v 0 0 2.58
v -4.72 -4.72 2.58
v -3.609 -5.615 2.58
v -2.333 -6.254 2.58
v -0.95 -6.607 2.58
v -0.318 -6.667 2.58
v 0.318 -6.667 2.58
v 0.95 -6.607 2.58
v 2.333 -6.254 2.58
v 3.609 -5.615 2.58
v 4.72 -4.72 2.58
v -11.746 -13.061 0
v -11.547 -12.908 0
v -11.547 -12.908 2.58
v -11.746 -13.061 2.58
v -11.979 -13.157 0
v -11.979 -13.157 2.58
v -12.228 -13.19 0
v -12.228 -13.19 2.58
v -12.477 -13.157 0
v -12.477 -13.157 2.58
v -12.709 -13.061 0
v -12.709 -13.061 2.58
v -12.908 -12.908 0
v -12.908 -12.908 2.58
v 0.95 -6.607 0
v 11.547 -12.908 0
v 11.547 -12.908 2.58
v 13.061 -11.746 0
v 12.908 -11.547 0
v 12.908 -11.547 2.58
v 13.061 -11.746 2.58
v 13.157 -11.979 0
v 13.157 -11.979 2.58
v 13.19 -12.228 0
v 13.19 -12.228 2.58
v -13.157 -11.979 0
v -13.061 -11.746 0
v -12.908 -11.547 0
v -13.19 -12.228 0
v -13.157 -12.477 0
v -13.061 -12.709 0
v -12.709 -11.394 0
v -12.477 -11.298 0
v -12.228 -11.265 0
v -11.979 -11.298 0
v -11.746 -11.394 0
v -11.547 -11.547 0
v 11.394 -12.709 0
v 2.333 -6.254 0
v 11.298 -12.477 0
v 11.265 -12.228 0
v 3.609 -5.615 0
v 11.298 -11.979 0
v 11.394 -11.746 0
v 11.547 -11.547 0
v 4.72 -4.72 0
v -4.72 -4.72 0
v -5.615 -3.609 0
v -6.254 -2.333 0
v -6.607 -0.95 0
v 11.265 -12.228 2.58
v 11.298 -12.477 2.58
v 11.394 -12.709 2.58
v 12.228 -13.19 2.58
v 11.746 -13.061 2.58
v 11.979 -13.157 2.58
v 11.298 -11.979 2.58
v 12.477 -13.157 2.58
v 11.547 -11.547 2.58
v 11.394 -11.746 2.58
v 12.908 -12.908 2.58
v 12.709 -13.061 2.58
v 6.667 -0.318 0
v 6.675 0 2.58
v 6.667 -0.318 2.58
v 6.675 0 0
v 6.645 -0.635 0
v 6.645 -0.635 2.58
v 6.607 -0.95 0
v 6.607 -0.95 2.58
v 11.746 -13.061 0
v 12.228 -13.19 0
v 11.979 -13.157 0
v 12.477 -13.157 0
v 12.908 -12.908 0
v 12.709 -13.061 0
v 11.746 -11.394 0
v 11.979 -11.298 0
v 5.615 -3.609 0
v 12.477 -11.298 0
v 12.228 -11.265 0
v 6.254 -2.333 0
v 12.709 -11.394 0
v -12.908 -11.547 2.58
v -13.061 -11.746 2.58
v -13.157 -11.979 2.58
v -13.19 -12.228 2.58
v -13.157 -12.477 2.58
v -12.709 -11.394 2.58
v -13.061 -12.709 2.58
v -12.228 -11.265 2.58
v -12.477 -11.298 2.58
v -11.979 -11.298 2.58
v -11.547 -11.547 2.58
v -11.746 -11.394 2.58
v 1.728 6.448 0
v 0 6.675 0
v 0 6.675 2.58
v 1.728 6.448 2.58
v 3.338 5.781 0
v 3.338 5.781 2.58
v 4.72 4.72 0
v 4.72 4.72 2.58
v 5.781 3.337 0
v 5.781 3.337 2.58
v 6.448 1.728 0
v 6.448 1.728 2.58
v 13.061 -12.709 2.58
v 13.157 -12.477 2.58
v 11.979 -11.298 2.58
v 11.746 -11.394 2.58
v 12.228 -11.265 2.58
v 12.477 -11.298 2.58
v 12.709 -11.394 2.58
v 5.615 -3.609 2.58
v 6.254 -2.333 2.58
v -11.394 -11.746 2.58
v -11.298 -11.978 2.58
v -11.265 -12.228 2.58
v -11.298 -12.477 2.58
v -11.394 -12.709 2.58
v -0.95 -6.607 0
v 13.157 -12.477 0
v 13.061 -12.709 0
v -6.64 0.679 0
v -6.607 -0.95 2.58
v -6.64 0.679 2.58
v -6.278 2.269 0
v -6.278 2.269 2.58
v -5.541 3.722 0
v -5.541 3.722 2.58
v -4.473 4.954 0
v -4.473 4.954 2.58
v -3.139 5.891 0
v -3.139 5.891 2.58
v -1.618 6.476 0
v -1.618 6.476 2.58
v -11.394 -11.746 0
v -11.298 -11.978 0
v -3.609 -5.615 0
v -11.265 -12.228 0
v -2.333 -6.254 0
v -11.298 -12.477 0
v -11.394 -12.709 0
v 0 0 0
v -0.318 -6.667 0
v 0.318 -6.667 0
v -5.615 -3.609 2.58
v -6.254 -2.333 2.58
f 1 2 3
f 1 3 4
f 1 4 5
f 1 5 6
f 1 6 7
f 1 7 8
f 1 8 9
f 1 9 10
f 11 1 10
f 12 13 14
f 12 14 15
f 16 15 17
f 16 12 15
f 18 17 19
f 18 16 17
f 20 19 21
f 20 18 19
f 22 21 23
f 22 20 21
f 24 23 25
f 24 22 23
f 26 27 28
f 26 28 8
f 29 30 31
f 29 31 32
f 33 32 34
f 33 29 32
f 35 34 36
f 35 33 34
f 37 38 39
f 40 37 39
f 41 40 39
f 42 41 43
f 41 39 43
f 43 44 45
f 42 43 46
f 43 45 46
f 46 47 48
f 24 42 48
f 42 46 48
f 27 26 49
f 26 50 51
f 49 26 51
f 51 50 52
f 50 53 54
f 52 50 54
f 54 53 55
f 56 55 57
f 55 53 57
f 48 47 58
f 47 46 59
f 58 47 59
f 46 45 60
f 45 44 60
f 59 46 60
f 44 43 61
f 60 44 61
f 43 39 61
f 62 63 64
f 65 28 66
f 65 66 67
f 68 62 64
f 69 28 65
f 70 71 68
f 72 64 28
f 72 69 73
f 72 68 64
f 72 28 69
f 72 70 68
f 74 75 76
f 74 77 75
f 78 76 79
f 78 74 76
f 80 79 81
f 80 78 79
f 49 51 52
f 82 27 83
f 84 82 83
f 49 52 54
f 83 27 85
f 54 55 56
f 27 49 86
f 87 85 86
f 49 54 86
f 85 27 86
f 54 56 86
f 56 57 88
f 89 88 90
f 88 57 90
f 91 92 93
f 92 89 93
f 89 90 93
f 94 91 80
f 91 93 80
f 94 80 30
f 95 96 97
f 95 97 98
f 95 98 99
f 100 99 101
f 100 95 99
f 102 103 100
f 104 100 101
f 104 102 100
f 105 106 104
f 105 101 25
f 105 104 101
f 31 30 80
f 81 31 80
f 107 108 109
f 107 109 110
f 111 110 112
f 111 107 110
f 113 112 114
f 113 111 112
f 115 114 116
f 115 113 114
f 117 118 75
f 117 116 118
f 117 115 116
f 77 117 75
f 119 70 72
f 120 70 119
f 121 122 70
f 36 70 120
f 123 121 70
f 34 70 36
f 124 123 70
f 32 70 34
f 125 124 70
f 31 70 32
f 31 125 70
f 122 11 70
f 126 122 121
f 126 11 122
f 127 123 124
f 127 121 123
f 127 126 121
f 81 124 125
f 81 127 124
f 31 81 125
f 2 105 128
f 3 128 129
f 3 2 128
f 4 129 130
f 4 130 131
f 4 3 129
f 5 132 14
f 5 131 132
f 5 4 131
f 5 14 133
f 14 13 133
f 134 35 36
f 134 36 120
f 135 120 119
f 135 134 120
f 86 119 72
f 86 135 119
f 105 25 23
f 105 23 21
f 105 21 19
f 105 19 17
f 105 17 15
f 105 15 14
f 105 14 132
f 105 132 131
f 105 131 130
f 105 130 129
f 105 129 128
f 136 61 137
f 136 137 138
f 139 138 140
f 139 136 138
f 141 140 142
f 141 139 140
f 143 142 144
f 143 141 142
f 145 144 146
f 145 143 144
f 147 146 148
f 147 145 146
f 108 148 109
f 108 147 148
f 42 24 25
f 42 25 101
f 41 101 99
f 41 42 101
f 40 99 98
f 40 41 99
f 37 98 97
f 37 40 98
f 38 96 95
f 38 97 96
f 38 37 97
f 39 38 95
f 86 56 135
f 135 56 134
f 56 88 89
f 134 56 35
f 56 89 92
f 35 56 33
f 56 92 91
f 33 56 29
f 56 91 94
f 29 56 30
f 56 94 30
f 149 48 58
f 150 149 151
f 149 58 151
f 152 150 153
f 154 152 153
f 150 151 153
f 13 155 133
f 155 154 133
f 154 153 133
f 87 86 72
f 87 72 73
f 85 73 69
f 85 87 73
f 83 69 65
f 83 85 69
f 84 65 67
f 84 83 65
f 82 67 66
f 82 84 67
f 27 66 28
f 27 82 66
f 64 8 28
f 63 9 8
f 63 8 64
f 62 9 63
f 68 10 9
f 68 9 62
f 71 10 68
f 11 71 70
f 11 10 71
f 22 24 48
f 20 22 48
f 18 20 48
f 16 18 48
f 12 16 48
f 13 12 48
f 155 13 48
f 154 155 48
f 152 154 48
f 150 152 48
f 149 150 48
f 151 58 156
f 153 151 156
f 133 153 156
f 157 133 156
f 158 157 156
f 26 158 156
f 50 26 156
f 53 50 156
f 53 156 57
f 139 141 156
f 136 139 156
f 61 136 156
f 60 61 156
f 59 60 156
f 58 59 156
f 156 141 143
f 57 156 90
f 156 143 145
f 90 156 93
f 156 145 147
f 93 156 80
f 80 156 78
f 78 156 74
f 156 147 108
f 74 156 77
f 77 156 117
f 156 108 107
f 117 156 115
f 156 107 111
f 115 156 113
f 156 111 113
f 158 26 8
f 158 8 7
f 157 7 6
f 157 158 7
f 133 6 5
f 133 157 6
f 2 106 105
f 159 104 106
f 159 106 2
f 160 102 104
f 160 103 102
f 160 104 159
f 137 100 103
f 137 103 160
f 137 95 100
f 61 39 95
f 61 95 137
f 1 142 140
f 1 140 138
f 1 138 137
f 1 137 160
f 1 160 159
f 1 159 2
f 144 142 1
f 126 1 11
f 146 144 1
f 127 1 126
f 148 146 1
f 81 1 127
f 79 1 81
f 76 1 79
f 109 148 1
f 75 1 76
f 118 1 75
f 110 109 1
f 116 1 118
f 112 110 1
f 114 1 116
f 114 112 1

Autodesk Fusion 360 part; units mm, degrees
sketch "Sketch1" plane through (0, 0, 0) normal (0, 0, 1) x (1, 0, 0)
  line L0 (0, 0) -> (12.9082, -12.9082)
  line L1 (1.75, 0) -> (22.5, 0)
  line L2 (0, 0) -> (-12.9082, -12.9082)
  circle A0 centre (-12.2276, -12.2276) radius 0.9625
  circle A1 centre (12.2276, -12.2276) radius 0.9625
  circle A2 centre (0, 0) radius 6.675
  line L3 (-13.701, -10.7542) -> (-10.5388, -13.9165) construction
  line L4 (-12.9082, -11.5471) -> (-6.607, -0.9502)
  line L5 (-11.5471, -12.9082) -> (-0.9502, -6.607)
  line L6 (0, 1.75) -> (0, 22.5)
  line L7 (12.9082, -11.5471) -> (6.607, -0.9502)
  line L8 (11.5471, -12.9082) -> (0.9502, -6.607)
  dimension "d1" = 18.255
  dimension "d2" = 45
  dimension "d4" = -90
  dimension "d5" = 1.925
  dimension "d6" = 1.925
  dimension "d7" = 13.35
  dimension "d8" = 8
extrude "Extrude1" add sketch "Sketch1" along normal blind 2.58
sketch "Sketch2" plane through (0, 0, 2.58) normal (0, 0, 1) x (-1, 0, 0)
  line L0 (-12.9082, 11.5471) -> (-6.607, 0.9502)
  arc A0 (-6.607, 0.9502) -> (6.607, 0.9502) centre (0, 0) ccw
  line L1 (6.607, 0.9502) -> (12.9082, 11.5471)
  arc A1 (12.9082, 11.5471) -> (11.5471, 12.9082) centre (12.2276, 12.2276) ccw
  line L2 (11.5471, 12.9082) -> (0.9502, 6.607)
  arc A2 (0.9502, 6.607) -> (-0.9502, 6.607) centre (0, 0) ccw
  line L3 (-0.9502, 6.607) -> (-11.5471, 12.9082)
  arc A3 (-11.5471, 12.9082) -> (-12.9082, 11.5471) centre (-12.2276, 12.2276) ccw
